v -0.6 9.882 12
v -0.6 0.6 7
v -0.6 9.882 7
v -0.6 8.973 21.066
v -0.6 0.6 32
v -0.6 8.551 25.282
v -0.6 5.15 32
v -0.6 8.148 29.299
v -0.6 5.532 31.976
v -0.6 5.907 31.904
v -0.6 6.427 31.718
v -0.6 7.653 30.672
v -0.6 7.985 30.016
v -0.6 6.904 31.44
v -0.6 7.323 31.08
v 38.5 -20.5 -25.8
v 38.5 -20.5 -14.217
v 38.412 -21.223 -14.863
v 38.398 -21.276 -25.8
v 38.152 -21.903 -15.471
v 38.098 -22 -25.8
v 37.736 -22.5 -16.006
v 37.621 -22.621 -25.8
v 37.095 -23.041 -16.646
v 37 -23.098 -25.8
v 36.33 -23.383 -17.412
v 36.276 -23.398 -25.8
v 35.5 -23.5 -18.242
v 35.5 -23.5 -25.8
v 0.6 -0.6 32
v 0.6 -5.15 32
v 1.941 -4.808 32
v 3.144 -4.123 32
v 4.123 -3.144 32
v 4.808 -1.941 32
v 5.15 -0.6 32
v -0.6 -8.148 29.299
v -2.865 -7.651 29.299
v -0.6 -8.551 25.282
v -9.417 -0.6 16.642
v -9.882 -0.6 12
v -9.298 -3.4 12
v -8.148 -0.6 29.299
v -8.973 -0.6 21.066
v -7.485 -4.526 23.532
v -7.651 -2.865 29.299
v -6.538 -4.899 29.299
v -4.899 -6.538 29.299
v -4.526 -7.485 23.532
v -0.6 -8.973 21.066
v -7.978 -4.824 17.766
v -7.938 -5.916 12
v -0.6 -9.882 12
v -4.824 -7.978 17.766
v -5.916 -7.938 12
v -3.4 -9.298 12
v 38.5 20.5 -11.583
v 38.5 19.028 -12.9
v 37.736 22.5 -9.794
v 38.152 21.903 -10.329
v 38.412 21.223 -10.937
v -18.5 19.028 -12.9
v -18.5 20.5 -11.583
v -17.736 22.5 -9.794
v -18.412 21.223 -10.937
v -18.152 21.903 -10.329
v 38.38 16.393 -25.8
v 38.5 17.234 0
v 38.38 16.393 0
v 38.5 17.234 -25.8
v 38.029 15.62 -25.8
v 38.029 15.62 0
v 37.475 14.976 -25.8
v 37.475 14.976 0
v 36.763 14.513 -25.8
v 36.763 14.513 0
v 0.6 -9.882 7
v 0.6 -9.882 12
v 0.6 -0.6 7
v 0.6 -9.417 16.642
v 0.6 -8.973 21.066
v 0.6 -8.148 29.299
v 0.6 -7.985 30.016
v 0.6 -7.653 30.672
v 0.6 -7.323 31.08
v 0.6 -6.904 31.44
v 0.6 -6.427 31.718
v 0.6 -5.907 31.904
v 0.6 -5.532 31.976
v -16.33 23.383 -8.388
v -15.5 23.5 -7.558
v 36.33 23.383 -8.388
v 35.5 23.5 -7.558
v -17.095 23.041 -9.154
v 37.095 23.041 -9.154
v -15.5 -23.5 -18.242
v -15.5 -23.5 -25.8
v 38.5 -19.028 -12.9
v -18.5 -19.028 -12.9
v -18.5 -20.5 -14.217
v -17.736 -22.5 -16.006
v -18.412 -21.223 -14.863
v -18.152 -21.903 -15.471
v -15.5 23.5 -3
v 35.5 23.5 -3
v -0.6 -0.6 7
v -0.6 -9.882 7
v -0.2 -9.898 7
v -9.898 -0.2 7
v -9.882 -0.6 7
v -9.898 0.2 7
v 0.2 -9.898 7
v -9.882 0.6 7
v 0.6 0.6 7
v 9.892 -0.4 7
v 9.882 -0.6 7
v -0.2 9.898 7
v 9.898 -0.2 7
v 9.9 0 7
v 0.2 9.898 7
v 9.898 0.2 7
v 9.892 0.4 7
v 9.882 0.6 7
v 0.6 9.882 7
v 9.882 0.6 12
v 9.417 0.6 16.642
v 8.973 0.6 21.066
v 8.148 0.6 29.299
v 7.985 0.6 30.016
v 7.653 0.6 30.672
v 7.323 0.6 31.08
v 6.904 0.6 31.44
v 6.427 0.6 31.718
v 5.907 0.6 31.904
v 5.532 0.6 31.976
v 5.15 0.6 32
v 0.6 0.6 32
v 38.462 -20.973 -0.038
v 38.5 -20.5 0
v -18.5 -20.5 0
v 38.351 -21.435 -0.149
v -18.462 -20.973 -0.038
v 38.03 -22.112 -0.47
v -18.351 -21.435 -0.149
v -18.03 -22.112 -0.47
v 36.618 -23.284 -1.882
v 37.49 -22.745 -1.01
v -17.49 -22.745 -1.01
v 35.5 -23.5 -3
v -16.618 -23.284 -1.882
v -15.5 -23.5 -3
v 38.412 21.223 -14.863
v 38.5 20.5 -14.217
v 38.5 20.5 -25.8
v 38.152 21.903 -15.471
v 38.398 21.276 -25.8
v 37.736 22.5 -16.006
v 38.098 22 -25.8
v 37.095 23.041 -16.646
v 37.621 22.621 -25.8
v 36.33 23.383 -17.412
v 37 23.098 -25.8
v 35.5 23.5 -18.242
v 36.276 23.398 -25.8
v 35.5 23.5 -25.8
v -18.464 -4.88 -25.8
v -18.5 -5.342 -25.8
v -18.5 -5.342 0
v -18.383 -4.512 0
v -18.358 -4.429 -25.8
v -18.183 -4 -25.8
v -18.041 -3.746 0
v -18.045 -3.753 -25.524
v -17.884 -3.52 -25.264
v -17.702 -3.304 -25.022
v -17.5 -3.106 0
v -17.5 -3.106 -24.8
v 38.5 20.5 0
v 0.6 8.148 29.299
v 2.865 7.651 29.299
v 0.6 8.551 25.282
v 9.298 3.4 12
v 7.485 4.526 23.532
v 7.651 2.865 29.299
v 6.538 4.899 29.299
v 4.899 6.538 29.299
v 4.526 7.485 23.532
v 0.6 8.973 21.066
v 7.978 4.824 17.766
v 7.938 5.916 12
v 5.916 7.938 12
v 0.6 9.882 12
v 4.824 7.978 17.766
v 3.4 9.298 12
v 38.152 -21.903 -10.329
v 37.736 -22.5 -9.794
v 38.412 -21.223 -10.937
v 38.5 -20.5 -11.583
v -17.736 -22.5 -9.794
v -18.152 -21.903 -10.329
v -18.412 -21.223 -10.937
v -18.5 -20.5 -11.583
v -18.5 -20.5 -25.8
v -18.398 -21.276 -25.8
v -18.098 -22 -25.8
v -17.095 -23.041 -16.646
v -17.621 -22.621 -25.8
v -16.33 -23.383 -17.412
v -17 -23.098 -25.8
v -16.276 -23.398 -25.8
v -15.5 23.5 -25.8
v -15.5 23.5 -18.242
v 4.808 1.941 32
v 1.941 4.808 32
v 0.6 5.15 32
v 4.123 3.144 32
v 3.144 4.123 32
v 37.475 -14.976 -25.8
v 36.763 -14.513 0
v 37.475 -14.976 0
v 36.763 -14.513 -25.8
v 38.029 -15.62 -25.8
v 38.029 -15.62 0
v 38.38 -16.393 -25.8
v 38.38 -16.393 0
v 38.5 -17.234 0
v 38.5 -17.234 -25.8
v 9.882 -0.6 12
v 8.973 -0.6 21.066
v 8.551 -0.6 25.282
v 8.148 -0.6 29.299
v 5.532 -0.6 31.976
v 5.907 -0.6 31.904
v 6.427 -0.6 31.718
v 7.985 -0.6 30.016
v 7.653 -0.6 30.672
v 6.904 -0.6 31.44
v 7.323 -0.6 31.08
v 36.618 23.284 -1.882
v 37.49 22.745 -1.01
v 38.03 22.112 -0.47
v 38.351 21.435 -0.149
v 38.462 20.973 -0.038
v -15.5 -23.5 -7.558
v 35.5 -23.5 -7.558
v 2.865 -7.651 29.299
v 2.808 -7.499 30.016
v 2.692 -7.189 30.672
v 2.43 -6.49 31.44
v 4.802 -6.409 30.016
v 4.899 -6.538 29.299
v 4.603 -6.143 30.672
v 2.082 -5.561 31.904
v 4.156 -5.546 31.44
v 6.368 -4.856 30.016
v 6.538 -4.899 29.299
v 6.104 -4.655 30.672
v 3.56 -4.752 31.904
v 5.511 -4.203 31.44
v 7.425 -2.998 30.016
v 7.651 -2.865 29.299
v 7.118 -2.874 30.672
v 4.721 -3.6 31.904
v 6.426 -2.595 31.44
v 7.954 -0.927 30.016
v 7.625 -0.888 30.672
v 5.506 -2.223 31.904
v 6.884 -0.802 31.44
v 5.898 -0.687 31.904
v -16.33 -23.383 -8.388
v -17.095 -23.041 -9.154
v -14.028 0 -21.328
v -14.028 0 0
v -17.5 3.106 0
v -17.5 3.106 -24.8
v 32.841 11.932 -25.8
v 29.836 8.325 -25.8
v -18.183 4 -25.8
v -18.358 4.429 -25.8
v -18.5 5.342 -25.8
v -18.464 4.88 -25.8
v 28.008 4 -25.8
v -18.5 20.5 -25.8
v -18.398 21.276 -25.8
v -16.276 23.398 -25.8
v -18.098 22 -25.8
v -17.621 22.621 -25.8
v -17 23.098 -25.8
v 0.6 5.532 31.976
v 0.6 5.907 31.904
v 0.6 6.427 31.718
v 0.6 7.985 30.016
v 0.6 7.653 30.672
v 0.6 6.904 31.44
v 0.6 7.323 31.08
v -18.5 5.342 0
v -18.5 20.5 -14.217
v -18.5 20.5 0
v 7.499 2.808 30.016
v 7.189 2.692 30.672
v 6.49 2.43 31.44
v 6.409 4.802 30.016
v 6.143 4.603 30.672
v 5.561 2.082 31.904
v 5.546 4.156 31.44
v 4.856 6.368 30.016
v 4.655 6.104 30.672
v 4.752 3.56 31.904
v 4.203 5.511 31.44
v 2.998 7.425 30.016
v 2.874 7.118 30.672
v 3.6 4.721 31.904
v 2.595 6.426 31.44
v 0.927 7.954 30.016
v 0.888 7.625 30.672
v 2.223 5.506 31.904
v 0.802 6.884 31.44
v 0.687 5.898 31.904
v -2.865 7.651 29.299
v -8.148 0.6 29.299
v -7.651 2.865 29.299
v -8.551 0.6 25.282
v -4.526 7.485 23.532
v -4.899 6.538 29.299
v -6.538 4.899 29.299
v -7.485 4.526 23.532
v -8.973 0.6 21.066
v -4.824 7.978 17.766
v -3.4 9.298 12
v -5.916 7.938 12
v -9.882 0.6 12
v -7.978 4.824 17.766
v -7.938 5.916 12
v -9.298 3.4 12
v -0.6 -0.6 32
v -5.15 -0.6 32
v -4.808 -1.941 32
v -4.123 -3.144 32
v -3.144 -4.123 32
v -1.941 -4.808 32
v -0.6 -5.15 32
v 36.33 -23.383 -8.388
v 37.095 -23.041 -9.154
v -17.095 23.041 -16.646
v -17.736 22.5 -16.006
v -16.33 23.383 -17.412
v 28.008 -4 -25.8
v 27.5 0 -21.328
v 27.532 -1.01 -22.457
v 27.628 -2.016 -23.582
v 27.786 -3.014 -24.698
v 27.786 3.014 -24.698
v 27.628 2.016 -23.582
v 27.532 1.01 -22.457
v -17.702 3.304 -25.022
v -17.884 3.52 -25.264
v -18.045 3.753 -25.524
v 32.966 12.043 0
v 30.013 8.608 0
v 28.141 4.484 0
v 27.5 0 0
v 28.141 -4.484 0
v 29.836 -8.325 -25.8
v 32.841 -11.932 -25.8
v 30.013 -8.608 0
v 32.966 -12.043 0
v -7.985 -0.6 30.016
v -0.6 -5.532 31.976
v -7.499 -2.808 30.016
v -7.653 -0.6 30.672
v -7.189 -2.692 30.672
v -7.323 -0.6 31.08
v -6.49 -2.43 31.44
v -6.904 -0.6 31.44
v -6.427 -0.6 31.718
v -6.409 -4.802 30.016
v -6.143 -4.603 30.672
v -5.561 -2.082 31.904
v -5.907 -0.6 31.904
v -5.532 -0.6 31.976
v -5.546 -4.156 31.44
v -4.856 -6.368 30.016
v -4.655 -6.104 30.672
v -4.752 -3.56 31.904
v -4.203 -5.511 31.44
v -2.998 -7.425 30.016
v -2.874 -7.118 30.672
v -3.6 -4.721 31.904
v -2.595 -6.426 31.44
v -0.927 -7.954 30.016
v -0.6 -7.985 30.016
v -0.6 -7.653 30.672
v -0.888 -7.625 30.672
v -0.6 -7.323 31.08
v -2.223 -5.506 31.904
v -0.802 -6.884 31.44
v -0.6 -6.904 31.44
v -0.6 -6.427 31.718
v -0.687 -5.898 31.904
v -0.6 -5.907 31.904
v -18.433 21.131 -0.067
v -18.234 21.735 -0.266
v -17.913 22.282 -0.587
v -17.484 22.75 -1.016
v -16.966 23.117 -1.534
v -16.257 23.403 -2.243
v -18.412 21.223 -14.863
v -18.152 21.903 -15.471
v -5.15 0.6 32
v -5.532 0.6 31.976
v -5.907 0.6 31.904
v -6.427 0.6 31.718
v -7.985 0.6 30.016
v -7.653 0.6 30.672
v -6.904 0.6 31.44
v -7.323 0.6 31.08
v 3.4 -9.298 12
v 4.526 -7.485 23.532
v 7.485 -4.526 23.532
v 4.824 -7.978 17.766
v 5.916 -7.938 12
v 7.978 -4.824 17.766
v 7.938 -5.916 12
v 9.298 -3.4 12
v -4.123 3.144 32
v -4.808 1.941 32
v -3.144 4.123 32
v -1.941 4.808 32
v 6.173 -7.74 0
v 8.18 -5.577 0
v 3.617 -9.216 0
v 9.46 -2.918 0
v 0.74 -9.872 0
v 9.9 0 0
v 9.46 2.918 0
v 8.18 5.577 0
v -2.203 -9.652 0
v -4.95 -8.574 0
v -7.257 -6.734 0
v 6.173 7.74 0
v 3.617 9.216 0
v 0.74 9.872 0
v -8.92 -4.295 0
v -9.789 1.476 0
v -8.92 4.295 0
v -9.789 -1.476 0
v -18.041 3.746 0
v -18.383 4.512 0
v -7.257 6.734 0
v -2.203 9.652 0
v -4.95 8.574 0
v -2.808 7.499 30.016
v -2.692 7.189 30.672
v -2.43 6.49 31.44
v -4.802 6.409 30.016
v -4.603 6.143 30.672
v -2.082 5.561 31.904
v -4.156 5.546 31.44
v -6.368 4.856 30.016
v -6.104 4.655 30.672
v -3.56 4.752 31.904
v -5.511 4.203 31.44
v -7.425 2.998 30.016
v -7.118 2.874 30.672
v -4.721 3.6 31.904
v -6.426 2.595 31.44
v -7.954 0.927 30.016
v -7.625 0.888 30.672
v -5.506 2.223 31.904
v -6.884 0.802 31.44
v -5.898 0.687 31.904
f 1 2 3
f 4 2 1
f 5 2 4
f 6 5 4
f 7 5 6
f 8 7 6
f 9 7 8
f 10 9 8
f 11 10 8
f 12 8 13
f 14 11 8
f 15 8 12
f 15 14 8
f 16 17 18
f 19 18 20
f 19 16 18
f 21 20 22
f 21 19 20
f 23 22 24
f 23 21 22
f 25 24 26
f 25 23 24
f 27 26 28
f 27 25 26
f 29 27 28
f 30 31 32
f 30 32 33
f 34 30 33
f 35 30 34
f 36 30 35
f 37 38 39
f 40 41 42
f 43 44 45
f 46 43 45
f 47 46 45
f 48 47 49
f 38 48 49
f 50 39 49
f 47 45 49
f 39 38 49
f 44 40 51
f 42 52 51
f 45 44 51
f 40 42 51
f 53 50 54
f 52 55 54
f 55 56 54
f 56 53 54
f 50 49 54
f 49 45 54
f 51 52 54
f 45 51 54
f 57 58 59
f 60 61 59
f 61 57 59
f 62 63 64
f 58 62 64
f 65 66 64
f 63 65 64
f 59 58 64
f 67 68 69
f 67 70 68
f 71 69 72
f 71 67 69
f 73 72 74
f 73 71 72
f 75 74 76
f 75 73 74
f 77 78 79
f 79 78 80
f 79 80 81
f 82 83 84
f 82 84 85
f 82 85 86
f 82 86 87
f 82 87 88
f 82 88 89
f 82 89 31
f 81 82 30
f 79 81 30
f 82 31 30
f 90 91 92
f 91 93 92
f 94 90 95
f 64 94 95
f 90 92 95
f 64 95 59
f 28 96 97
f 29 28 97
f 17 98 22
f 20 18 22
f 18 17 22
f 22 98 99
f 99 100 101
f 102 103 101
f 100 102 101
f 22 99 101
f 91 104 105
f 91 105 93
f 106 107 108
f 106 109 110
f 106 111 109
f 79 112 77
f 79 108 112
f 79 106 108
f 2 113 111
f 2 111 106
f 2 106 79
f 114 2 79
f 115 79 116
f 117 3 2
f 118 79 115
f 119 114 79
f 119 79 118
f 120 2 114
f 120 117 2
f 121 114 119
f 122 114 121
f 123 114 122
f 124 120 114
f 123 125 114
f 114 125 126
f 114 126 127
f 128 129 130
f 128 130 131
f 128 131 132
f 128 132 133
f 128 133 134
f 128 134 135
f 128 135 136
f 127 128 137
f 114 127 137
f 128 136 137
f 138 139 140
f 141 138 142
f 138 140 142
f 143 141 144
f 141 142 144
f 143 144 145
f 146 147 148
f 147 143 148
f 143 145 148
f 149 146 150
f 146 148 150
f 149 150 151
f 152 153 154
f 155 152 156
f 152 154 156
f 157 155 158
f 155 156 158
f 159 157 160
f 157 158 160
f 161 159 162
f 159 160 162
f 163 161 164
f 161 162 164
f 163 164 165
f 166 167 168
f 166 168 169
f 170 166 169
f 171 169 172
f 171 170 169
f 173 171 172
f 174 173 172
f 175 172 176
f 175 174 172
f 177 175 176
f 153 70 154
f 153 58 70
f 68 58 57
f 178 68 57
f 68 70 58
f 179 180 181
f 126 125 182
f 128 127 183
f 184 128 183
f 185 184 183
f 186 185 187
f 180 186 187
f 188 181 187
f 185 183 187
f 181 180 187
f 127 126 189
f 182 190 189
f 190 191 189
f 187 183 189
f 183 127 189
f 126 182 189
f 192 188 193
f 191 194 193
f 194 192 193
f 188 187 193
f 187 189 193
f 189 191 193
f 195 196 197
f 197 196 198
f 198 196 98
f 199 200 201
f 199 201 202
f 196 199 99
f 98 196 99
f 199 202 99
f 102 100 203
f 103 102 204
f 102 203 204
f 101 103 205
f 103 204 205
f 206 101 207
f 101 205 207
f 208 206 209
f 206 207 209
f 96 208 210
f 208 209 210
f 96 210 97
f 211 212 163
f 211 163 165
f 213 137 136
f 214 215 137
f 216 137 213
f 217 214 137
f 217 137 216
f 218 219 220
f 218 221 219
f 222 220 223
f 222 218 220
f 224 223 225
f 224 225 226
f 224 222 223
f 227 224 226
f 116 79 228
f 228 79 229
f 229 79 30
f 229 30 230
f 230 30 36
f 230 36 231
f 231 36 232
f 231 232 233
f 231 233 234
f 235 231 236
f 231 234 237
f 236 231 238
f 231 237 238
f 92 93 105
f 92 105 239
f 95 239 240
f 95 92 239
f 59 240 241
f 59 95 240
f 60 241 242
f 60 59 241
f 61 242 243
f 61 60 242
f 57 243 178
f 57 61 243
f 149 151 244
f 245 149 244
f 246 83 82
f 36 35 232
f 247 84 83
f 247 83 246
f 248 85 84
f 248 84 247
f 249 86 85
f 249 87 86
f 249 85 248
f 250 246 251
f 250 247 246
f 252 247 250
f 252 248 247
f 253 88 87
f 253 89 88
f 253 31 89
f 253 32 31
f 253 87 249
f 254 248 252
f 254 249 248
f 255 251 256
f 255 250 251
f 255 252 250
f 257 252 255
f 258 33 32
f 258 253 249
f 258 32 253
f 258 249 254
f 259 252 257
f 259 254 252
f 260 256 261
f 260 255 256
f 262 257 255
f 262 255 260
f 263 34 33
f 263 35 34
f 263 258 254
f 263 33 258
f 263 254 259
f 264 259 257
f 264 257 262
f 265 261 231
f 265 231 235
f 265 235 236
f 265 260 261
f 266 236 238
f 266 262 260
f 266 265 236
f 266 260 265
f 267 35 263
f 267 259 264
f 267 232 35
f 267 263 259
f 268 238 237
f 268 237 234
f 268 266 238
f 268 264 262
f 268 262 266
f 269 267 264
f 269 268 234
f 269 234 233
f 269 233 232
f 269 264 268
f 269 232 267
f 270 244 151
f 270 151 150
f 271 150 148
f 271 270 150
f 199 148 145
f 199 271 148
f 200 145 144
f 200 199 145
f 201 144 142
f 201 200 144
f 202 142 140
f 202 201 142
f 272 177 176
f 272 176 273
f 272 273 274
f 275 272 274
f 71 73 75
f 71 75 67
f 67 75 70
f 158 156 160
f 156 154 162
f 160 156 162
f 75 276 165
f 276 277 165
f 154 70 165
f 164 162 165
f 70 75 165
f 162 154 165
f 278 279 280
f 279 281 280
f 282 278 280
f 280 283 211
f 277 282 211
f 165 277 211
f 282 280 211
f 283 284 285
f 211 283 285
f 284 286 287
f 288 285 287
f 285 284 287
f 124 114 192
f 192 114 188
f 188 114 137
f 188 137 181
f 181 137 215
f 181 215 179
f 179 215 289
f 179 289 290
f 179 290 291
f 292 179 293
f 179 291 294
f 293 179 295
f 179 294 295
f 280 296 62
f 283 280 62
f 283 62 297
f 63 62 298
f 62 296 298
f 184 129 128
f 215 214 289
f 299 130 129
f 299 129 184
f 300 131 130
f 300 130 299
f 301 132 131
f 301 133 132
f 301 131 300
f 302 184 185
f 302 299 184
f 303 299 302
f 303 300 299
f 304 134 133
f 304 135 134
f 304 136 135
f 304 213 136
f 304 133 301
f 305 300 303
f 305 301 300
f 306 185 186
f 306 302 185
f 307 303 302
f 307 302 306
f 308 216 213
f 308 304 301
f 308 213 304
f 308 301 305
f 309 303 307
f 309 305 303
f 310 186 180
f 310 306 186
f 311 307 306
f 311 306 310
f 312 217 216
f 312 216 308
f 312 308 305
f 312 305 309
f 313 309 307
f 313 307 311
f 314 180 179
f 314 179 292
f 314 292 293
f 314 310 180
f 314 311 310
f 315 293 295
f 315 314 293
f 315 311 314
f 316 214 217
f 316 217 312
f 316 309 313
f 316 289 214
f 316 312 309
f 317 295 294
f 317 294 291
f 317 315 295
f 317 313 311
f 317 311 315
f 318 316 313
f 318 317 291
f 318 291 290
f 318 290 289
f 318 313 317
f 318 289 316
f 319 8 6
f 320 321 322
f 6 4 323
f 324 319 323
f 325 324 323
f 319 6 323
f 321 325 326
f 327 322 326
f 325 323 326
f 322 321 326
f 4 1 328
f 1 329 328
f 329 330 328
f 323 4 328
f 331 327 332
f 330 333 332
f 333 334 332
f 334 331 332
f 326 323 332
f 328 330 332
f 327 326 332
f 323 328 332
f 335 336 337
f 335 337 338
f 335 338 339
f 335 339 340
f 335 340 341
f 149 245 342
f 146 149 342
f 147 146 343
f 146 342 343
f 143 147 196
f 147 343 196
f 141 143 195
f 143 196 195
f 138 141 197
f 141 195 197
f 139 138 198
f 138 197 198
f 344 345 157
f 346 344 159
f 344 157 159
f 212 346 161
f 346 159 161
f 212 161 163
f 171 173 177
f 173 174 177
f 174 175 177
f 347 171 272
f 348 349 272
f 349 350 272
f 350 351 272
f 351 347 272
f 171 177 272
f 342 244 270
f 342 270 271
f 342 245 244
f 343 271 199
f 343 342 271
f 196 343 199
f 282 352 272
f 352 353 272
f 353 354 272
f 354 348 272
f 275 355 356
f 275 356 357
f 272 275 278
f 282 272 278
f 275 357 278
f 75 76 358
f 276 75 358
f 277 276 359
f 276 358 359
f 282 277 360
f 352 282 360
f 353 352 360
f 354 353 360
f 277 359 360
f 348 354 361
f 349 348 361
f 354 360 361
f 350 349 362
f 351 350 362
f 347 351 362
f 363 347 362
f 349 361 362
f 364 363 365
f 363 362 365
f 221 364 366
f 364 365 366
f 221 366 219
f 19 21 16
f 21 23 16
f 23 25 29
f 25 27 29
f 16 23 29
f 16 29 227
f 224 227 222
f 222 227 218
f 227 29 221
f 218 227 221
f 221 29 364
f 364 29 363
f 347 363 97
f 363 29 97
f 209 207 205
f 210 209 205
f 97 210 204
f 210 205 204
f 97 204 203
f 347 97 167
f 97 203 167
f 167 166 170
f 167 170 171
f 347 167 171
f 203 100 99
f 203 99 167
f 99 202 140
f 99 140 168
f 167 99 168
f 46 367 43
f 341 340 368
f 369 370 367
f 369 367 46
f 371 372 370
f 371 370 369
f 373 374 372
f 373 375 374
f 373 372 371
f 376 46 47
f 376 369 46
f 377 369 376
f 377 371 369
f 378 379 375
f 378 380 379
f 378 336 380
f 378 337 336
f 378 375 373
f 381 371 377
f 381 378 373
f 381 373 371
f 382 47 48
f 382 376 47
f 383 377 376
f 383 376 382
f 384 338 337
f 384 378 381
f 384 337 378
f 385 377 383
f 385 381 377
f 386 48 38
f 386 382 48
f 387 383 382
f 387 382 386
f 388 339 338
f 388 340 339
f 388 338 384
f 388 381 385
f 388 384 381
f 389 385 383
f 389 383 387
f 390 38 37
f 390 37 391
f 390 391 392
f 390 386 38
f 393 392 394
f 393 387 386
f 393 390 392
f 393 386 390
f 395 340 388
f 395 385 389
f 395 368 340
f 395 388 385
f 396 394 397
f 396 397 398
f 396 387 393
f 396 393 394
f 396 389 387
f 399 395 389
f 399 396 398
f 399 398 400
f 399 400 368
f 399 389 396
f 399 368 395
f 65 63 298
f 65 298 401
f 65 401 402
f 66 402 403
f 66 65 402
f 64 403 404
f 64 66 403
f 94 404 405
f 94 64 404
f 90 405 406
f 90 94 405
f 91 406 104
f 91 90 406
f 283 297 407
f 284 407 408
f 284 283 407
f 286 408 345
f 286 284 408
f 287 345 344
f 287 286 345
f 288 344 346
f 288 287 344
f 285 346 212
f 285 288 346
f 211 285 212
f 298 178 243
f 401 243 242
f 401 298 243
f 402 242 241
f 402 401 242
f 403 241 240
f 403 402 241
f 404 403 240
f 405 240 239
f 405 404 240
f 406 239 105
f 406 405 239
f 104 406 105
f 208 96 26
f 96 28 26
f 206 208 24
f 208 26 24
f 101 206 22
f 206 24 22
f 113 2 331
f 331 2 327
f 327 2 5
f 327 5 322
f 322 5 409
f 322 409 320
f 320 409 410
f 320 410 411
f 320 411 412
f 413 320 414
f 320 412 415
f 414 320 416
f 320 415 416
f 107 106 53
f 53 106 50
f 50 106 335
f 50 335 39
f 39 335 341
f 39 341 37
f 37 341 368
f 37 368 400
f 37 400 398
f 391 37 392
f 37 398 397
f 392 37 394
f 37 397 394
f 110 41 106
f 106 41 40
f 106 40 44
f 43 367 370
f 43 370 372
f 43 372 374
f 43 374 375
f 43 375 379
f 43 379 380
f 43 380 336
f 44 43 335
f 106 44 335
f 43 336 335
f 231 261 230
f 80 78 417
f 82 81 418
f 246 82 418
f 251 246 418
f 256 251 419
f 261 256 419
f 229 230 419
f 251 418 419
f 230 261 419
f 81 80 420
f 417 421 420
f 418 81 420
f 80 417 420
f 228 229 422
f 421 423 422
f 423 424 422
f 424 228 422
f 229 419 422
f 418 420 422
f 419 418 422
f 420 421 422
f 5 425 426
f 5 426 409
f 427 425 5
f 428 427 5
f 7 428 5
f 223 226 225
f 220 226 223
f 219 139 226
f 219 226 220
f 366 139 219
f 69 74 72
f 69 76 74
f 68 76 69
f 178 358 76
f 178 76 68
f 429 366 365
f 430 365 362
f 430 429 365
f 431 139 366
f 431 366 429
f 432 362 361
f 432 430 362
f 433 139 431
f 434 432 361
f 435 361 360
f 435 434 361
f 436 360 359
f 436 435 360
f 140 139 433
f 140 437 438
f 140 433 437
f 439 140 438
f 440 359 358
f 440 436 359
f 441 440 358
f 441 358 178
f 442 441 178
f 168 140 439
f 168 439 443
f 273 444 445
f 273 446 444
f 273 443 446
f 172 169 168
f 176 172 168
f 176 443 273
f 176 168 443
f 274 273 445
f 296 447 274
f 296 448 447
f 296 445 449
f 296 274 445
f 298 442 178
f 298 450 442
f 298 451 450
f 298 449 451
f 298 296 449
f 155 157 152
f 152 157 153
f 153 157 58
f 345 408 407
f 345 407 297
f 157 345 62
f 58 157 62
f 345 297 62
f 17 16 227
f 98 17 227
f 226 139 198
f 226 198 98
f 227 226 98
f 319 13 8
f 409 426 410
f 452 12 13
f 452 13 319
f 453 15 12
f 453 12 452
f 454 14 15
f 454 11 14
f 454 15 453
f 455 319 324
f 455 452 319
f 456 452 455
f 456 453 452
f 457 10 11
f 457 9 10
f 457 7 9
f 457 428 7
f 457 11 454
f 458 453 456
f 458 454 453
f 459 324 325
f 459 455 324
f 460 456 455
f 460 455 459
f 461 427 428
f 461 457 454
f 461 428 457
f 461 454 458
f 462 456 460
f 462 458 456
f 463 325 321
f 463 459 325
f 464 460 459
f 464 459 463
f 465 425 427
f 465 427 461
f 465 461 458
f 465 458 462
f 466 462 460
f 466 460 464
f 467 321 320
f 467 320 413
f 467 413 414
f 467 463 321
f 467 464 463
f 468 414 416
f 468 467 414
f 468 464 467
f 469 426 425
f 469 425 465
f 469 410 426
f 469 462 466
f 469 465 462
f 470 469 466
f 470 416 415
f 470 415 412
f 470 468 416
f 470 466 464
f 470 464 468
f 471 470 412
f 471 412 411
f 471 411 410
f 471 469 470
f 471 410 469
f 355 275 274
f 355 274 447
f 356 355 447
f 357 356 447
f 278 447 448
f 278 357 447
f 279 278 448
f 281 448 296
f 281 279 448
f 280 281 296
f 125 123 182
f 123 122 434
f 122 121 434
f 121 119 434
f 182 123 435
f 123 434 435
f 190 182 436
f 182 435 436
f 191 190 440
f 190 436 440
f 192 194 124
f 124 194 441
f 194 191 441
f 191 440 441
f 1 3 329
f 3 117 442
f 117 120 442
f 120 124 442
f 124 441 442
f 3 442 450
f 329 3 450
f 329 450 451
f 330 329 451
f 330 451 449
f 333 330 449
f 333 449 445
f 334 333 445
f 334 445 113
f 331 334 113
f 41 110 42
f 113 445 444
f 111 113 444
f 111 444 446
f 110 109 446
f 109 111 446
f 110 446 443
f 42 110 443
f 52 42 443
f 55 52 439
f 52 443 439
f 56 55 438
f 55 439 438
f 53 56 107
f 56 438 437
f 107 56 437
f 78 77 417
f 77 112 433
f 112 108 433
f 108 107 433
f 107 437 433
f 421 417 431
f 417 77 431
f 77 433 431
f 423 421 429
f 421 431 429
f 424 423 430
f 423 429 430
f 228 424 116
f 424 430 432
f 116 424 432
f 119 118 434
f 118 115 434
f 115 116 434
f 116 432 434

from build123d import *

# Parameters (mm, degrees)
F0_R      = 9.9
F1_DEPTH  = 32
F0_W      = 37
F0_H      = 47
F2_DEPTH  = 25.8
F3_DEPTH  = 20
F5_SIZE2  = 20
F5_SIZE   = 2
F6_DEPTH  = 25.801
F8_DEPTH  = 57.001
F11_DEPTH = 57.001
F12_DEPTH = 25.801
F13_W     = 1.2
F13_H     = 9.9
F13_H_2   = 1.2
F13_W_2   = 9.9
F14_DEPTH = 25
F15_R     = 3


with BuildPart() as f1:
    # F0 (on Top) → F1 (new body)
    with BuildSketch(Plane.XY):
        Circle(F0_R)
    extrude(amount=F1_DEPTH)

    # F0 (on Top) → F2 (join)
    with BuildSketch(Plane.XY):
        Rectangle(F0_W, F0_H)
        Circle(F0_R, mode=Mode.SUBTRACT)
        Circle(F0_R)
    extrude(amount=-F2_DEPTH)

    # F3 (add): a face of the model
    f3_faces = [f1.faces().sort_by_distance(p)[0] for p in [
        (18.5, 0, -12.9),
    ]]
    extrude(f3_faces, amount=F3_DEPTH)

    # F5
    f5_edges = [f1.edges().sort_by_distance(p)[0] for p in [
        (-9.9, 0, 32),
    ]]
    f5_side = f1.faces().sort_by_distance((0, 0, 32))[0]
    chamfer(f5_edges, length=F5_SIZE, length2=F5_SIZE2, reference=f5_side)

    # F4 (on face) → F6 (cut, through all)
    with BuildSketch(Plane.XY):
        with BuildLine():
            Line((38.5, -15.1986841536), (38.5, 15.1986841536))
            ThreePointArc((38.5, 15.1986841536), (27.5, 0), (38.5, -15.1986841536))
        make_face()
    extrude(amount=-F6_DEPTH, mode=Mode.SUBTRACT)

    # F7 (on face) → F8 (cut, through all)
    with BuildSketch(Plane(origin=(-18.5, 0, 0), x_dir=(0, -1, 0), z_dir=(-1, 0, 0))):
        Polygon((-23.5, -16.9), (-19.027864045, -12.9), (-23.5, -8.9), align=None)
        Polygon((19.027864045, -12.9), (23.5, -16.9), (23.5, -8.9), align=None)
    extrude(amount=-F8_DEPTH, mode=Mode.SUBTRACT)

    # F10 (on face) → F11 (cut, through all)
    with BuildSketch(Plane(origin=(-18.5, 0, 0), x_dir=(0, -1, 0), z_dir=(-1, 0, 0))):
        Polygon((4, -25.8), (0, -21.327864045), (-4, -25.8), align=None)
    extrude(amount=-F11_DEPTH, mode=Mode.SUBTRACT)

    # F9 (on face) → F12 (cut, through all)
    with BuildSketch(Plane.XY):
        Polygon((-18.5, -4), (-14.027864045, 0), (-18.5, 4), align=None)
    extrude(amount=-F12_DEPTH, mode=Mode.SUBTRACT)

    # F13 (on face) → F14 (cut)
    with BuildSketch(Plane.XY.offset(32)):
        with Locations((0, -5.55)):
            Rectangle(F13_W, F13_H)
        Rectangle(F13_W, F13_H_2)
        with Locations((5.55, 0)):
            Rectangle(F13_W_2, F13_H_2)
        with Locations((-5.55, 0)):
            Rectangle(F13_W_2, F13_H_2)
        with Locations((0, 5.55)):
            Rectangle(F13_W, F13_H)
    extrude(amount=-F14_DEPTH, mode=Mode.SUBTRACT)

    # F15
    f15_edges = [f1.edges().sort_by_distance(p)[0] for p in [
        (-18.5, 23.5, -4.45),
        (-18.5, 23.5, -21.35),
        (-18.5, -23.5, -4.45),
        (-18.5, -23.5, -21.35),
        (38.5, -23.5, -4.45),
        (38.5, -23.5, -21.35),
        (38.5, 15.198684, -12.9),
        (38.5, -15.198684, -12.9),
        (38.5, 23.5, -4.45),
        (38.5, 23.5, -21.35),
        (10, -23.5, 0),
        (10, 23.5, 0),
        (10, 23.5, -16.9),
        (10, -23.5, -8.9),
        (10, -23.5, -16.9),
        (10, 23.5, -8.9),
        (-18.5, 4, -12.9),
        (-18.5, -4, -12.9),
        (-5.586144, 5.586144, 32),
        (-5.586144, -5.586144, 32),
        (5.586144, -5.586144, 32),
        (5.586144, 5.586144, 32),
    ]]
    fillet(f15_edges, radius=F15_R)


solid = f1.part
